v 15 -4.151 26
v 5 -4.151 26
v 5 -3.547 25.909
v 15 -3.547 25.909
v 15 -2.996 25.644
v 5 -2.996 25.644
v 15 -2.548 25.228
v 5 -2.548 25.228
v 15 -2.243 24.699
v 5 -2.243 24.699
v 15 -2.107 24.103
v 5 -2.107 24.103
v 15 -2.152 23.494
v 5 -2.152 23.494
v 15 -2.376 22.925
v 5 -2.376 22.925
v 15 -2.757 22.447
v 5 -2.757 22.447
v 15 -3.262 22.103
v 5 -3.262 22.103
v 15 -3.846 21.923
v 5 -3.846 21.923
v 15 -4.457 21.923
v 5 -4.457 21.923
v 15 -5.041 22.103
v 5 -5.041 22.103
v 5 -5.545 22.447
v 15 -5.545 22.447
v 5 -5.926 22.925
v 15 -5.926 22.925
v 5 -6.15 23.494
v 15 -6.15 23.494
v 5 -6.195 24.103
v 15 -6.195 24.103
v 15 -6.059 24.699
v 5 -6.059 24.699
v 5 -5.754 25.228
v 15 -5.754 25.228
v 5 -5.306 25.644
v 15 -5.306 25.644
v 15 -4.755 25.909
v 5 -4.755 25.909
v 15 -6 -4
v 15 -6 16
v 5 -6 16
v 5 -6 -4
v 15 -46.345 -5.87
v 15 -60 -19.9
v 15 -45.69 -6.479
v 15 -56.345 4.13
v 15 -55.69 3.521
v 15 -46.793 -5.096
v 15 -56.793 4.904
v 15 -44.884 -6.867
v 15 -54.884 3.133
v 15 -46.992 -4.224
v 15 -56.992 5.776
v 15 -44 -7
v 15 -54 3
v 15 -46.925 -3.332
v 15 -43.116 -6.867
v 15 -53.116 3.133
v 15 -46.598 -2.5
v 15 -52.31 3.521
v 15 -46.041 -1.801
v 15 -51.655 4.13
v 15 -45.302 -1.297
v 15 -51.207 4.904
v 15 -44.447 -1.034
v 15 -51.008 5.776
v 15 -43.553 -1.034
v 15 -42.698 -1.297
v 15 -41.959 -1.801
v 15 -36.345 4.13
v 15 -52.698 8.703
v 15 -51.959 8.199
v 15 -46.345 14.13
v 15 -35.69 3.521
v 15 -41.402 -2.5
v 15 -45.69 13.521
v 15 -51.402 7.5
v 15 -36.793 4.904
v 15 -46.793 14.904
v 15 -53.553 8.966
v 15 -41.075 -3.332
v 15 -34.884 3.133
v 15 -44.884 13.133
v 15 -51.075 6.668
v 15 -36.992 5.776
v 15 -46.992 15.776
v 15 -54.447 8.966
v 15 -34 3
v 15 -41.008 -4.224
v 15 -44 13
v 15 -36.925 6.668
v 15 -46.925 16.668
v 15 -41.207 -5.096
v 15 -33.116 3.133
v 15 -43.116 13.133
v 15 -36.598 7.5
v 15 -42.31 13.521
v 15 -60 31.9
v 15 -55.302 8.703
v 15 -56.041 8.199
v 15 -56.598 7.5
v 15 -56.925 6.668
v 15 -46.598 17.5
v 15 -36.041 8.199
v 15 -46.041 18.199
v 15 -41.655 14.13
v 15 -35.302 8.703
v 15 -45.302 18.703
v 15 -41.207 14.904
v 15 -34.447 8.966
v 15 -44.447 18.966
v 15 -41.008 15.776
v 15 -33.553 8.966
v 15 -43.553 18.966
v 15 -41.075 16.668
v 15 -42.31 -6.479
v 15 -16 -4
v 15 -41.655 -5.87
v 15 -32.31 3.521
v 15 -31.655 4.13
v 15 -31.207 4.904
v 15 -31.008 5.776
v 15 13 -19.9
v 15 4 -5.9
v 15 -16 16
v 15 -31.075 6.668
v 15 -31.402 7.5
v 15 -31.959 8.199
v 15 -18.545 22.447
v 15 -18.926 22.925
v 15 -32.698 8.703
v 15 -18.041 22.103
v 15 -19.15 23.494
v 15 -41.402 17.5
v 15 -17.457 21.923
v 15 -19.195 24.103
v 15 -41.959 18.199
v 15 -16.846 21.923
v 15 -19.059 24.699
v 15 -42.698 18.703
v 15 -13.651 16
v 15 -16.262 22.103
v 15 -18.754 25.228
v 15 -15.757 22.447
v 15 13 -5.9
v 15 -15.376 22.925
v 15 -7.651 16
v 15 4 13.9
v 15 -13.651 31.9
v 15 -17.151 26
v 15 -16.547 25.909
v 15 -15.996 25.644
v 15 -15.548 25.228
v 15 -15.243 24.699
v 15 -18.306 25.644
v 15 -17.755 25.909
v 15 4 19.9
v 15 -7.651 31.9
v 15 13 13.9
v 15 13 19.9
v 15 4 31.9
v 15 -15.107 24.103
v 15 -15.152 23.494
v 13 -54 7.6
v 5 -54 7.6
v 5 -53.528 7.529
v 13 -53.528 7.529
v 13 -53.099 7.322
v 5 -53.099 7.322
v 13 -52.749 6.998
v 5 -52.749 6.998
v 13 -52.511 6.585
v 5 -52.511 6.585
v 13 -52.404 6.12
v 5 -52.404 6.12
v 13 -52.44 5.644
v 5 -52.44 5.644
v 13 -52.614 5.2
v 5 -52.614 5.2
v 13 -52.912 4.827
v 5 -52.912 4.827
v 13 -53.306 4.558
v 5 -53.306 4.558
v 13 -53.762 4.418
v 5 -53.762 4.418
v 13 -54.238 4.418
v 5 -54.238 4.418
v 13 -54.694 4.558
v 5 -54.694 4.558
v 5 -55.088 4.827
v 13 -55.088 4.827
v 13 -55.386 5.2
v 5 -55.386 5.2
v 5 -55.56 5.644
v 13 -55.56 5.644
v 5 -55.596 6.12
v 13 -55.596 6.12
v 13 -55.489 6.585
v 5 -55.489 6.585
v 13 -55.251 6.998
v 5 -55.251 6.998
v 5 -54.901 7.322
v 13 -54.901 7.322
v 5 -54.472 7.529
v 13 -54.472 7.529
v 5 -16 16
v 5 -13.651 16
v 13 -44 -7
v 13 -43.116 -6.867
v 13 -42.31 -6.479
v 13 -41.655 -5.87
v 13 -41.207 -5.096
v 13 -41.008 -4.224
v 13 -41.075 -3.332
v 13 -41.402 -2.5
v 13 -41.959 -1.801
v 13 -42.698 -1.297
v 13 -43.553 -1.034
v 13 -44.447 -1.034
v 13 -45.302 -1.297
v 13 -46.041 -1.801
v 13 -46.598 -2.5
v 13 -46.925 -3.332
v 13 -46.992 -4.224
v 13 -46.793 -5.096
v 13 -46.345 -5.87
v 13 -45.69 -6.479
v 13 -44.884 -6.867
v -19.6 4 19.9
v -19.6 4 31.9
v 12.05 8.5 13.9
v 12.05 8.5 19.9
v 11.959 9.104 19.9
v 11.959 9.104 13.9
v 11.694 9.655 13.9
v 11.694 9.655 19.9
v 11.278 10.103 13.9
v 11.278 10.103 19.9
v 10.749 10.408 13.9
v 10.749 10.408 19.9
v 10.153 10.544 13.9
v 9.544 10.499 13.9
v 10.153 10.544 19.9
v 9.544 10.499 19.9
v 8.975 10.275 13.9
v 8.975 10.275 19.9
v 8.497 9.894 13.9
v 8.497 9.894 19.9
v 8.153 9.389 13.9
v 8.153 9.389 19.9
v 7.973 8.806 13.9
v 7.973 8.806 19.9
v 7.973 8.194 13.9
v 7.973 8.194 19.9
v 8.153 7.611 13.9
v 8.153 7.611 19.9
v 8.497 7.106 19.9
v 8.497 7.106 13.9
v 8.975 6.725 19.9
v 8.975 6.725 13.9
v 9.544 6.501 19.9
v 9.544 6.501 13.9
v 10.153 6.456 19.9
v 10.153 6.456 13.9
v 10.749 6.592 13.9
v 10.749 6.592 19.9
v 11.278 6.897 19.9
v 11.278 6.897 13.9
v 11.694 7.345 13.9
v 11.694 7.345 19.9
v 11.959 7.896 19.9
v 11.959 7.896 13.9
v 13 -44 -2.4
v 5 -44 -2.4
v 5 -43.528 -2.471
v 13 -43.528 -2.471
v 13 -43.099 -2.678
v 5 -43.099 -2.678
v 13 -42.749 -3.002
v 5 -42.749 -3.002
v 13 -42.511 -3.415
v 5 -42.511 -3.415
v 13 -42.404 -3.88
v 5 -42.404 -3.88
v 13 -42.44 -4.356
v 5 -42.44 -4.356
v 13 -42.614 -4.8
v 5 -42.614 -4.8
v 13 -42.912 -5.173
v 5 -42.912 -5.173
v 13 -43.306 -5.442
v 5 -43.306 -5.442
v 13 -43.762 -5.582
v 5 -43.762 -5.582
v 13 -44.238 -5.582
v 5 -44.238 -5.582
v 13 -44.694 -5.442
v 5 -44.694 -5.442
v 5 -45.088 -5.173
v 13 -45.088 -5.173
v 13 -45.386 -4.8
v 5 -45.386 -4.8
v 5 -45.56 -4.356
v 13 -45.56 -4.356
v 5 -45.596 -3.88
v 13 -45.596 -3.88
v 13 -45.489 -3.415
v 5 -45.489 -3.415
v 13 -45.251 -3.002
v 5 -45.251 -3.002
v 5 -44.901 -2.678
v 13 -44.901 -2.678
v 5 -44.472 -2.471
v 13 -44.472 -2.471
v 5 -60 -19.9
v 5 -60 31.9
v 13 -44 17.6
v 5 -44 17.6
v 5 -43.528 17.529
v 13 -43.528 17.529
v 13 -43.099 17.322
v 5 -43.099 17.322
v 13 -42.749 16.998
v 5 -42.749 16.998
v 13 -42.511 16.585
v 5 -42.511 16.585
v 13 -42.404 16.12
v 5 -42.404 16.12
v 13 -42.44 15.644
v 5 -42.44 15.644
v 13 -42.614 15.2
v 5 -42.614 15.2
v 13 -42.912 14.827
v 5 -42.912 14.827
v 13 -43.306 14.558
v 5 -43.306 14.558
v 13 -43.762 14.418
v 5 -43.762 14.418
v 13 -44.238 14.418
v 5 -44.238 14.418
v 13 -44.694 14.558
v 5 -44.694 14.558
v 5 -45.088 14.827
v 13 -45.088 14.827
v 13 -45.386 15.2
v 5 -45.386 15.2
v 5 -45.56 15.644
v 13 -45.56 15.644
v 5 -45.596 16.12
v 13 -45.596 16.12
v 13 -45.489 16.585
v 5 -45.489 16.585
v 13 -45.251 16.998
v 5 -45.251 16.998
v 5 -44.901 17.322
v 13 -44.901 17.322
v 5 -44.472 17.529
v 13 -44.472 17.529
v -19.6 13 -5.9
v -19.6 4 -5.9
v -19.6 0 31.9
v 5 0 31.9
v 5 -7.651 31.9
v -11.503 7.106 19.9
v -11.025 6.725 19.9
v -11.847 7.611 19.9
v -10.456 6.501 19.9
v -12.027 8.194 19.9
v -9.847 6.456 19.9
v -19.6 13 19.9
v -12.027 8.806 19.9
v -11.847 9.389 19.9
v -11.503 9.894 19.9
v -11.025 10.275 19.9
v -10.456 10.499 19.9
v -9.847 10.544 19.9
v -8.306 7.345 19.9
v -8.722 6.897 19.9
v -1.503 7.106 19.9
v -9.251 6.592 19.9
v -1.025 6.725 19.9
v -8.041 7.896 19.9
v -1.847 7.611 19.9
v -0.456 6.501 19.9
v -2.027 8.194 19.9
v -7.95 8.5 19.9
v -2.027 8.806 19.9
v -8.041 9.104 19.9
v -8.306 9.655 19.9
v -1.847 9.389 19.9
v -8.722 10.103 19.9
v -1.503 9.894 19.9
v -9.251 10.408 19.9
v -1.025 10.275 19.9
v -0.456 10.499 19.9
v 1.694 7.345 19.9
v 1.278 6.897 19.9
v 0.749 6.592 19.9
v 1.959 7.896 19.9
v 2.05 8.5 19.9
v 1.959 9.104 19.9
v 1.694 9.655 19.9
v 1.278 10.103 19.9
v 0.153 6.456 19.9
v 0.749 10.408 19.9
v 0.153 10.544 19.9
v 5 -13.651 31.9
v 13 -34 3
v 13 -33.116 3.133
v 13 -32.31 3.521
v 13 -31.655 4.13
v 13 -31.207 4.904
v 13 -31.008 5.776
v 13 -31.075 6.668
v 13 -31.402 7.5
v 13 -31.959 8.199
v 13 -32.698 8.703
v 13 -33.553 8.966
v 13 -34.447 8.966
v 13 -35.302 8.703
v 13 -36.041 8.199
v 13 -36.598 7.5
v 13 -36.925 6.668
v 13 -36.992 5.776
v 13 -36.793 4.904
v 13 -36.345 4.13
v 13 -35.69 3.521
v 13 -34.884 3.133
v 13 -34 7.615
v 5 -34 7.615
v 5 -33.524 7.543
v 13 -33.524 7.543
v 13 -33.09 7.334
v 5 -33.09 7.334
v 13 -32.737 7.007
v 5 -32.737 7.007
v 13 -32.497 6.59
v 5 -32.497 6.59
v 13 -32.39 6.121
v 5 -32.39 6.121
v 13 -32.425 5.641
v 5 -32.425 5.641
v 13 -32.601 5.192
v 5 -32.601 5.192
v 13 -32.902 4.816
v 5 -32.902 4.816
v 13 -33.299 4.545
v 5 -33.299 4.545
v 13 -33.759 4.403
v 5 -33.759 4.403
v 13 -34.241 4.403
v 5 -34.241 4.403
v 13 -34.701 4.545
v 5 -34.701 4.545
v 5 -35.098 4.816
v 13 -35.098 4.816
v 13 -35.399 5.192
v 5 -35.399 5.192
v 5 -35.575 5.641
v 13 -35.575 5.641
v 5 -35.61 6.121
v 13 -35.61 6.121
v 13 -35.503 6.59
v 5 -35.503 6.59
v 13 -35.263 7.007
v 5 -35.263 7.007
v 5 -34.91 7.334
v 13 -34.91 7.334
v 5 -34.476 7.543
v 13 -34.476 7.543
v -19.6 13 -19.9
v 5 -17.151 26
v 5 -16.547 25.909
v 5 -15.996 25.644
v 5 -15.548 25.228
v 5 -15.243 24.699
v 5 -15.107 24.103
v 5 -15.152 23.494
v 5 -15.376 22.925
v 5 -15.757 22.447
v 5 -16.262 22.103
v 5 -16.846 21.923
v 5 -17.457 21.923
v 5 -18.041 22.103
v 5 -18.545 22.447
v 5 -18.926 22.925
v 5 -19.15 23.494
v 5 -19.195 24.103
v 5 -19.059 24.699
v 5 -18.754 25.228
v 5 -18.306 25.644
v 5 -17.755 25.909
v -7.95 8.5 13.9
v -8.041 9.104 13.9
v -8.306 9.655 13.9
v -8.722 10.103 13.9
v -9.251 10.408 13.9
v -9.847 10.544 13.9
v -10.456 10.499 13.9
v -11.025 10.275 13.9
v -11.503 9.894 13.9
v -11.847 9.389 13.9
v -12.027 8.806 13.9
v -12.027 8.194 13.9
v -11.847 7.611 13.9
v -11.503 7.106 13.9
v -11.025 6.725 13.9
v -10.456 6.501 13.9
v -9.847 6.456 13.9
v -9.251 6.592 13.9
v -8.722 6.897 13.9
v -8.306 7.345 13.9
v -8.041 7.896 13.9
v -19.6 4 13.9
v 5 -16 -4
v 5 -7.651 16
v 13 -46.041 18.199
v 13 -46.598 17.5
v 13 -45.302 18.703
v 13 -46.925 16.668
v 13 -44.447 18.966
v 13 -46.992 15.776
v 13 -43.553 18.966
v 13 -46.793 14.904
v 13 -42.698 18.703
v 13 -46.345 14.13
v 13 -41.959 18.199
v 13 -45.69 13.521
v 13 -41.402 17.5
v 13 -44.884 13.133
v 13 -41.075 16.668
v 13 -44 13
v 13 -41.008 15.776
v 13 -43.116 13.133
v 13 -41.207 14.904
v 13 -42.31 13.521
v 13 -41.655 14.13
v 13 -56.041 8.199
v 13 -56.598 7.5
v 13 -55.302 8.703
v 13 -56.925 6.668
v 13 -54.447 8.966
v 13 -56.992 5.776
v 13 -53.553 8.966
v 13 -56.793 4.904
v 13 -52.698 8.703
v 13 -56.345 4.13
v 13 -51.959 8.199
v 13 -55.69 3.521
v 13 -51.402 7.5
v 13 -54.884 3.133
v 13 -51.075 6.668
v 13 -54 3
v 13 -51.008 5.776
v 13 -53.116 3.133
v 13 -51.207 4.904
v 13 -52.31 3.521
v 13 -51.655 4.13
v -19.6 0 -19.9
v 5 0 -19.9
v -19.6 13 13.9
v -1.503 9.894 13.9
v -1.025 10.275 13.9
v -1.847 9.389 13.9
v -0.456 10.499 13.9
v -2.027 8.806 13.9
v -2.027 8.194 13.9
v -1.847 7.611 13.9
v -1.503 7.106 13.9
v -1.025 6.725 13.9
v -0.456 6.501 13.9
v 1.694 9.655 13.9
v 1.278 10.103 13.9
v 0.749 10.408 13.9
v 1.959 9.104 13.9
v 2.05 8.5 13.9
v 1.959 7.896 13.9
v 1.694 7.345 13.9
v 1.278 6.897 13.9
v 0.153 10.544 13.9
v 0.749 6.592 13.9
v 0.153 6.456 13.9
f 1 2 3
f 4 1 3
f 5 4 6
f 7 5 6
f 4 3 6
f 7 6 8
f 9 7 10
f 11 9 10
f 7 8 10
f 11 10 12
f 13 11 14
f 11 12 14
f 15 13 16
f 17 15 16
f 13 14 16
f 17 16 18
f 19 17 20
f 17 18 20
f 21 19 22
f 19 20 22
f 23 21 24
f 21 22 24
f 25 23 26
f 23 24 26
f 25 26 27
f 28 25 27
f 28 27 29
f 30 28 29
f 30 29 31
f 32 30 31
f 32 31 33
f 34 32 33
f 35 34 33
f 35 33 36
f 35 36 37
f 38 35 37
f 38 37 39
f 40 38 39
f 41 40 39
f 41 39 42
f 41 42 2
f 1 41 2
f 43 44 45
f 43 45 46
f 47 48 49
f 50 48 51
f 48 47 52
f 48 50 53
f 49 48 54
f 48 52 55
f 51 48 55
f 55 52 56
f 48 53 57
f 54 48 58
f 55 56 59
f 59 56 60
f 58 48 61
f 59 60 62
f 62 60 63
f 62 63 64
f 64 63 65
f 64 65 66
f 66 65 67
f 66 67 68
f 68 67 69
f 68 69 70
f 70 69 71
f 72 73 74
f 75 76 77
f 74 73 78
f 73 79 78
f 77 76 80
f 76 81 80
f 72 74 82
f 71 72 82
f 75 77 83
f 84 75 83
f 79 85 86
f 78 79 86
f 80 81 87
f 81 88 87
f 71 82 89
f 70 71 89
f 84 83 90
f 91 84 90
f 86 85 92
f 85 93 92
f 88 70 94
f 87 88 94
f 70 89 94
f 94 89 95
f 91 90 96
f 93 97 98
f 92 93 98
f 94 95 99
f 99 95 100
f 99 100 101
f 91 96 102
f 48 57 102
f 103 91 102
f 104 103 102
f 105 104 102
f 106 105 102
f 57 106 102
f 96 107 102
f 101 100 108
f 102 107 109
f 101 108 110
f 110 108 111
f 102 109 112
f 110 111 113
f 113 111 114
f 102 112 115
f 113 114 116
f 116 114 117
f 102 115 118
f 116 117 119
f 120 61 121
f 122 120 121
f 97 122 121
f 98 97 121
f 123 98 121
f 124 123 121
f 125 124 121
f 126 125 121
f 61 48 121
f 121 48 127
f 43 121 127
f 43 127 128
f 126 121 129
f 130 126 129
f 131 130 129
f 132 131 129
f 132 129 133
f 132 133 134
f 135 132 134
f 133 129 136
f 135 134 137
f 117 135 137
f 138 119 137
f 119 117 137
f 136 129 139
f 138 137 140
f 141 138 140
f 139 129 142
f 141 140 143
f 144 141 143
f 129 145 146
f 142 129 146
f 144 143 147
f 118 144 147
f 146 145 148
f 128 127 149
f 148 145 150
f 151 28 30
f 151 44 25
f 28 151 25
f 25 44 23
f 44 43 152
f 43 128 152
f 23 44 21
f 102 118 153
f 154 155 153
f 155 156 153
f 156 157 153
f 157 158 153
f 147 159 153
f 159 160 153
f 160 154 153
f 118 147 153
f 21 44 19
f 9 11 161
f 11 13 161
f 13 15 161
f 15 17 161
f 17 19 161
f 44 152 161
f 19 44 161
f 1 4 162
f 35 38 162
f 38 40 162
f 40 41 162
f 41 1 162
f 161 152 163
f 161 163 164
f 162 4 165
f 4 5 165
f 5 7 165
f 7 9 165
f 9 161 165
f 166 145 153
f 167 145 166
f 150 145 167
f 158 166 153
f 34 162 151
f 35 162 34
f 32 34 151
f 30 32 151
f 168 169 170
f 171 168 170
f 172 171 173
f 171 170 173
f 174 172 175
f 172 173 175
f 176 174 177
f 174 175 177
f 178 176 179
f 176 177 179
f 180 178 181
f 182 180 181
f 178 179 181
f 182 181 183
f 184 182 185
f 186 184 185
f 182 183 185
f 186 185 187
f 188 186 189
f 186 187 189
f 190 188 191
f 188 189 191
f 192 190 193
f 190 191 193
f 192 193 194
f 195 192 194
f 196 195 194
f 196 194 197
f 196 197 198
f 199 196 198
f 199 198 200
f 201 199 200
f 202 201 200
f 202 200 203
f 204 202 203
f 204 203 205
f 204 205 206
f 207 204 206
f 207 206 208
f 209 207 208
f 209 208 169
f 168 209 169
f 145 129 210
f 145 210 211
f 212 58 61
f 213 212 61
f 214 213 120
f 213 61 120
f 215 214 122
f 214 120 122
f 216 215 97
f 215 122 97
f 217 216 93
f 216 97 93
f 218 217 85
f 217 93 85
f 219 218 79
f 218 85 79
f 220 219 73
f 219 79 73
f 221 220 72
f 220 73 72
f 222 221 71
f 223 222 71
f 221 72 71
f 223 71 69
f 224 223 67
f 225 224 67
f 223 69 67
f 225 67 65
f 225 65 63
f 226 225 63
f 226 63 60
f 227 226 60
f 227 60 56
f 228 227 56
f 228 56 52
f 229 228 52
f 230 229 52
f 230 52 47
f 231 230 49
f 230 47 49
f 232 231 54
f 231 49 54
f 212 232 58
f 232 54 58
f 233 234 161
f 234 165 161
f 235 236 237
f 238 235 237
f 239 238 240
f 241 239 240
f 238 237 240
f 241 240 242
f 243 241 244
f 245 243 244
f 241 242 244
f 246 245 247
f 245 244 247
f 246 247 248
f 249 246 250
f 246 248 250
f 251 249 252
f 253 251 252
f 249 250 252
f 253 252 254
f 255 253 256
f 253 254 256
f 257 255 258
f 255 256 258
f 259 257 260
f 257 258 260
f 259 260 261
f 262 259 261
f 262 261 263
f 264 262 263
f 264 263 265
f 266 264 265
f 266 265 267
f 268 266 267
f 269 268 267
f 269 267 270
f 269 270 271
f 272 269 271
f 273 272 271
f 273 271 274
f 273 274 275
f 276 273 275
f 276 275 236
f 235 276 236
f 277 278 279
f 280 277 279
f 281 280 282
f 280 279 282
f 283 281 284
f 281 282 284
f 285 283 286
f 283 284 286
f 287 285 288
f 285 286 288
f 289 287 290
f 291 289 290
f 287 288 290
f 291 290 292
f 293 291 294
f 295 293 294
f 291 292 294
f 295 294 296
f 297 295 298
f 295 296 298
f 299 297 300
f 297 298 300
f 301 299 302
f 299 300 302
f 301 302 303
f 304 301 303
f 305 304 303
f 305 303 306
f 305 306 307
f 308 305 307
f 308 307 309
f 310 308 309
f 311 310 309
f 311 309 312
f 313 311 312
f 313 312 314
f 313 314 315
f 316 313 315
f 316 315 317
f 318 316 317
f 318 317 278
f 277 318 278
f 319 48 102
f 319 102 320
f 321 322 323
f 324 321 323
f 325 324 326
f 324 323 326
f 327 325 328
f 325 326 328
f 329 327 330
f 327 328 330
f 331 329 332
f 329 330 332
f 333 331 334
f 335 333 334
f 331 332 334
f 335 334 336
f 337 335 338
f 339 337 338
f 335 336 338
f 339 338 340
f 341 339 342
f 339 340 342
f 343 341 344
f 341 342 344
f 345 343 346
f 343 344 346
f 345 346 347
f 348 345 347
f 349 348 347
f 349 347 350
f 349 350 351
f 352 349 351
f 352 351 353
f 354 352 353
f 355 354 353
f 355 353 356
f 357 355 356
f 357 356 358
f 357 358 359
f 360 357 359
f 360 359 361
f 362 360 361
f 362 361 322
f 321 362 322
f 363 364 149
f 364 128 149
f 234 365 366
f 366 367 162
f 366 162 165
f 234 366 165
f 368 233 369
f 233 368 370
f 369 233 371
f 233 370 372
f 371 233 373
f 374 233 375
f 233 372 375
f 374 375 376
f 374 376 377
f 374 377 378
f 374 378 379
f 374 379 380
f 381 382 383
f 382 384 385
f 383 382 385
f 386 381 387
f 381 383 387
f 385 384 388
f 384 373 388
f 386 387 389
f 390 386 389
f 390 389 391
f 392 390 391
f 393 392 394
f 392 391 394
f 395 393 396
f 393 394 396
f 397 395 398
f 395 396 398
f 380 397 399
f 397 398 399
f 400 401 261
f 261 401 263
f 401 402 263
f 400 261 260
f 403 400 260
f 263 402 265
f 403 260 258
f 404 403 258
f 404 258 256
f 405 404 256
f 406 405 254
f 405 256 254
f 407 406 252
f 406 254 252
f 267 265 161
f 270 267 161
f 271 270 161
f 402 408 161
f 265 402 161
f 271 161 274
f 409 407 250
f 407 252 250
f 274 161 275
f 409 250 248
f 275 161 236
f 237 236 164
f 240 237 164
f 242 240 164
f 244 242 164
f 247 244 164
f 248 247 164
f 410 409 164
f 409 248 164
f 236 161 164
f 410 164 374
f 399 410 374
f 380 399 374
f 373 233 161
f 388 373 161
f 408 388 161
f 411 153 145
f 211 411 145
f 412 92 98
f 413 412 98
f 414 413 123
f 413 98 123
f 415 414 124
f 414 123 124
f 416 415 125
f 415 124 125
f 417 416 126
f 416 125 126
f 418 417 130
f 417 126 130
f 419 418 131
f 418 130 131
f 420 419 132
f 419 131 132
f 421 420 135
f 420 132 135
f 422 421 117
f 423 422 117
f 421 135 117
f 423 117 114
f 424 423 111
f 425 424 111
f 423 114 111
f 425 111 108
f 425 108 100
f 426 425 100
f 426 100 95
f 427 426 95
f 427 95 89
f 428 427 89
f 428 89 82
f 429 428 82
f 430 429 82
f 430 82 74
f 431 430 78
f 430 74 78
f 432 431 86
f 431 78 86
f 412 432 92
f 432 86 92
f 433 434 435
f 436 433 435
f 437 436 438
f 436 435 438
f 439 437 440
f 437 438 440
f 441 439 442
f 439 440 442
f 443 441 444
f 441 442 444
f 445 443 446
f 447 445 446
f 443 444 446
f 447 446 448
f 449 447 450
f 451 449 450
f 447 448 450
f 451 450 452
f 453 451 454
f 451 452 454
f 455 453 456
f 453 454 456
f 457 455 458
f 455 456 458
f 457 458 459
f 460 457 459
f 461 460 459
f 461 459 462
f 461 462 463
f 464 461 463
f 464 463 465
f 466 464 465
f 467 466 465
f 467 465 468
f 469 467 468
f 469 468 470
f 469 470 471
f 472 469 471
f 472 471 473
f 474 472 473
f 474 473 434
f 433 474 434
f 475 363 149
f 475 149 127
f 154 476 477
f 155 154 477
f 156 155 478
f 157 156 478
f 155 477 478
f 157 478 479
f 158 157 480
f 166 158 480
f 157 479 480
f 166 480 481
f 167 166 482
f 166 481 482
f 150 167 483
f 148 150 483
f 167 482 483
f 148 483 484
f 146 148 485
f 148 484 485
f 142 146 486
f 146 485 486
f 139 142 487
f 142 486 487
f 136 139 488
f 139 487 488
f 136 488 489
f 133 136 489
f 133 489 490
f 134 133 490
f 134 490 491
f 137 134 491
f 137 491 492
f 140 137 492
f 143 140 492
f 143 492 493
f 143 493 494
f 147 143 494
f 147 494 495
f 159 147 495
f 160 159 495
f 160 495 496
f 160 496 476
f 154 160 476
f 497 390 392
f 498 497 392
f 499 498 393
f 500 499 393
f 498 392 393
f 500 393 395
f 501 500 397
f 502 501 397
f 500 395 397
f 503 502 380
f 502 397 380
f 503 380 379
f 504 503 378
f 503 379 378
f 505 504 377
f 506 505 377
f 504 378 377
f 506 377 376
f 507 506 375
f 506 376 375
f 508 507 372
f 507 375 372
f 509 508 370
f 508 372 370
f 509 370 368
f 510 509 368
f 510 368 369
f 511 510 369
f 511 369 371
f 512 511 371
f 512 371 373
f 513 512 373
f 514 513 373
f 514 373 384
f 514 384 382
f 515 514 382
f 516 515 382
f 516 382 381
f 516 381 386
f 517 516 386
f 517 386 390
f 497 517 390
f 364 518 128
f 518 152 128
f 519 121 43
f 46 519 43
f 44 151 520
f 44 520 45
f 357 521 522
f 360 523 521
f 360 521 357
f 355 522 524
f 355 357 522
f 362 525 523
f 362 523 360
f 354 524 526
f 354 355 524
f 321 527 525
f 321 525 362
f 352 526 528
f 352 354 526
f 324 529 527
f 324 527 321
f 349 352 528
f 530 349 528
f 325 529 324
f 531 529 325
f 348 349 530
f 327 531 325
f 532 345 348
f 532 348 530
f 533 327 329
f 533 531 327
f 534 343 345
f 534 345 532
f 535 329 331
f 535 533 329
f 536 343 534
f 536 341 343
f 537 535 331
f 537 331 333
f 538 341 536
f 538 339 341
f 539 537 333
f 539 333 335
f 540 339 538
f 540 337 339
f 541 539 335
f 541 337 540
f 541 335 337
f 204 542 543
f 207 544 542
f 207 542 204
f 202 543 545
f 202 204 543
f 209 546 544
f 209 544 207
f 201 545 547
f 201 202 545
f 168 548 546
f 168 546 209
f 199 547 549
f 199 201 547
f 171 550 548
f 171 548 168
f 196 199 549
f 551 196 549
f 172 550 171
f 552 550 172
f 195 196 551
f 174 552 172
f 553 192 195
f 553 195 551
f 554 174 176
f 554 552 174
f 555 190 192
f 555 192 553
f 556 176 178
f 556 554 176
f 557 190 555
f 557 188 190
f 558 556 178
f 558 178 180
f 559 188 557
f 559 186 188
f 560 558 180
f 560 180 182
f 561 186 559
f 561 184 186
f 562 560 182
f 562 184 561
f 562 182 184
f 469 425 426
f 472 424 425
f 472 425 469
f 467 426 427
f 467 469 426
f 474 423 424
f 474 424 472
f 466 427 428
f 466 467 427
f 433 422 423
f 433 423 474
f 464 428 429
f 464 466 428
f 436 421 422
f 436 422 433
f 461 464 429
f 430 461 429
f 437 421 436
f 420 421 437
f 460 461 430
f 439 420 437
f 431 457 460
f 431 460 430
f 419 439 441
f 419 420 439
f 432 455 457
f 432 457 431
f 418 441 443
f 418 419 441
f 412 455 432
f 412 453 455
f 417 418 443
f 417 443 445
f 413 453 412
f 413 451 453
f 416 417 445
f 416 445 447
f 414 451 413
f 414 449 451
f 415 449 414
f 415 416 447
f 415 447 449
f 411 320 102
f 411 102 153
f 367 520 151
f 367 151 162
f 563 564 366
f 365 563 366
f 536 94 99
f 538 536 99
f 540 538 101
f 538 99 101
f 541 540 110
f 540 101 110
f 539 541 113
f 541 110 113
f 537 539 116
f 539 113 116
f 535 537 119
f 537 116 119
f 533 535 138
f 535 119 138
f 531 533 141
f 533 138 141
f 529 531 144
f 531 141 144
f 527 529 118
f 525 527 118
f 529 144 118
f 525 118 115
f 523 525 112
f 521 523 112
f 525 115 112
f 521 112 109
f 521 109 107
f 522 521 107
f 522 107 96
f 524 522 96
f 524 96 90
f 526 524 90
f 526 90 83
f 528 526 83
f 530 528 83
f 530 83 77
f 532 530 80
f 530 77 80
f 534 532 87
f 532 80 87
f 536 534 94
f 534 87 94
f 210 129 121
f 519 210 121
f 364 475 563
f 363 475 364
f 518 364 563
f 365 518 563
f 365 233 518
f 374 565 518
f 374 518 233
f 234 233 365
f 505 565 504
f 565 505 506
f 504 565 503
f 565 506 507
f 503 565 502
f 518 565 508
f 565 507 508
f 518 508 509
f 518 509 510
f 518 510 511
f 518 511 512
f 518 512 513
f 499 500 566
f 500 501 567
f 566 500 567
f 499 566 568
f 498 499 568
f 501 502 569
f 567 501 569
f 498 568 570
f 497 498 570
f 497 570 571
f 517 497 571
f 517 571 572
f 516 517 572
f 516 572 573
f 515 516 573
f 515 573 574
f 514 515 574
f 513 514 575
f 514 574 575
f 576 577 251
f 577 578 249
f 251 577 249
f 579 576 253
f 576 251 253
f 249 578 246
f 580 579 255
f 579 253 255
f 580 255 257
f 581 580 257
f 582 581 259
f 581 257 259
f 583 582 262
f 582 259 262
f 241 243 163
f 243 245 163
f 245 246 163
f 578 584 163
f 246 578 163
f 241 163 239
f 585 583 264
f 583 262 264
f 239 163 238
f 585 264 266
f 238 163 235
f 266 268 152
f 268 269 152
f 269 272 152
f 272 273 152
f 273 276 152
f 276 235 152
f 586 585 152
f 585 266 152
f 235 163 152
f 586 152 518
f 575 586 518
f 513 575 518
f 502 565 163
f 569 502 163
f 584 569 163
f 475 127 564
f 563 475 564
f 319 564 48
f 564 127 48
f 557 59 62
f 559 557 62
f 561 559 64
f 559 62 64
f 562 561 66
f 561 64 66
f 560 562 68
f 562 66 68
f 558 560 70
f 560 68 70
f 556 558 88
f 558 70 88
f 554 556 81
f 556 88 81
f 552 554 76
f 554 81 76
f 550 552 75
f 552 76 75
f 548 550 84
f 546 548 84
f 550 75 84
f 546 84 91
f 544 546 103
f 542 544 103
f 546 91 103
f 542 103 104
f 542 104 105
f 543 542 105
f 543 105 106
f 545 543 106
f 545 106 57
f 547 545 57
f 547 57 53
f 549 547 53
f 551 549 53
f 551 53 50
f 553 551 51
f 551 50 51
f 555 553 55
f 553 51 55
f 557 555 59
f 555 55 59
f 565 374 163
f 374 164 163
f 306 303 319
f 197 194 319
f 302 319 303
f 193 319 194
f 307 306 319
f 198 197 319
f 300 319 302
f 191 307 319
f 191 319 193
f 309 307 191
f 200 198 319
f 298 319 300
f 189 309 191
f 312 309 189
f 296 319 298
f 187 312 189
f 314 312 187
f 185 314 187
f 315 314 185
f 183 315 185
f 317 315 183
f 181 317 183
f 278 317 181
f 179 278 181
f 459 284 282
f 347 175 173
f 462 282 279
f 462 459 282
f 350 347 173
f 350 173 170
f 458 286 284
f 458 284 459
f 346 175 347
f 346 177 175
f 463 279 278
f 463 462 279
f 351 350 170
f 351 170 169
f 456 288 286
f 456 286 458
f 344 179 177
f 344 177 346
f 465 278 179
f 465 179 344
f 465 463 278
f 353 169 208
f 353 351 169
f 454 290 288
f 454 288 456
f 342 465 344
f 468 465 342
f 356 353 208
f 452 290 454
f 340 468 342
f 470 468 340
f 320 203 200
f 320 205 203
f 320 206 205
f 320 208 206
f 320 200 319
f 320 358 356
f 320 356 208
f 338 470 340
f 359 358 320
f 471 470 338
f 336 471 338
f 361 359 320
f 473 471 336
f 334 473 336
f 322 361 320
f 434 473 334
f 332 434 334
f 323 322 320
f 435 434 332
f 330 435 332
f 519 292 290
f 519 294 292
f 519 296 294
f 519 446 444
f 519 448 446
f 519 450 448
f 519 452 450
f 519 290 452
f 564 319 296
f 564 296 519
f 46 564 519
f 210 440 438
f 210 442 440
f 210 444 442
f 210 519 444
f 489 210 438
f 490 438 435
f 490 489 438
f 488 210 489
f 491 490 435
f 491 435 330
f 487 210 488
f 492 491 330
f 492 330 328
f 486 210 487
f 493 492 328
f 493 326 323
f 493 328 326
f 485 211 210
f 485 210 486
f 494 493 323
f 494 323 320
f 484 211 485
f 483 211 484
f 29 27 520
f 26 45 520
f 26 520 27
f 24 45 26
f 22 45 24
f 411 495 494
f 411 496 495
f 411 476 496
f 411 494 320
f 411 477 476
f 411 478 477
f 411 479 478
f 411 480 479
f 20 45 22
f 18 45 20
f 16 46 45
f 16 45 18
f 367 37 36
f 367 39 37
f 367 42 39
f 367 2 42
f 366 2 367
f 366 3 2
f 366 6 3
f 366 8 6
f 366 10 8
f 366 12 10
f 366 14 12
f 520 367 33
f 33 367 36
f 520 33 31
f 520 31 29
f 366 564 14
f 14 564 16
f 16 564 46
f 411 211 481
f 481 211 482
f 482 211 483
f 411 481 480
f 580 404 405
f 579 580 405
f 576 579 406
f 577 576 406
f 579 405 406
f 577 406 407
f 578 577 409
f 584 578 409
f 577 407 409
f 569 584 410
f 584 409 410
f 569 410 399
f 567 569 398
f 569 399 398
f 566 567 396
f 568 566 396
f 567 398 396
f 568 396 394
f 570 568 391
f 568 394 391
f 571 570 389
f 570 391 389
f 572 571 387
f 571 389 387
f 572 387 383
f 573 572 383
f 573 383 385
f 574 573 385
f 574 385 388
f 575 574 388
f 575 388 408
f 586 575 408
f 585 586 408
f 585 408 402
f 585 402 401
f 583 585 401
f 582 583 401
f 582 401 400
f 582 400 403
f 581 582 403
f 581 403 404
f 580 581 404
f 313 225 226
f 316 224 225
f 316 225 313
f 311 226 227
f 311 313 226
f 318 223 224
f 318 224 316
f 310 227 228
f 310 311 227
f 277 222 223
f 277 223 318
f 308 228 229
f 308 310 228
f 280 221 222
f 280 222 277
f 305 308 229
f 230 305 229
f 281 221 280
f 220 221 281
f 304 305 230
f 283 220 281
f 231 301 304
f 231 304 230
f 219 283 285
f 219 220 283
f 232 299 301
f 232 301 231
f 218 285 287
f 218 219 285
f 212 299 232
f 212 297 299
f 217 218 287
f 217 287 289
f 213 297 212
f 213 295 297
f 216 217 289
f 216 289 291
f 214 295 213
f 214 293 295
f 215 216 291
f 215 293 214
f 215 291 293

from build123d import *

# Parameters (mm, degrees)
SKETCH_1_W          = 30
SKETCH_1_H          = 39.8
EXTRUDE_1_DEPTH     = 4
SKETCH_2_W          = 30
SKETCH_2_H          = 14
EXTRUDE_2_DEPTH     = 9
SKETCH_3_W          = 30
SKETCH_3_H          = 6
EXTRUDE_3_DEPTH     = 9
SKETCH_4_W          = 10
SKETCH_4_H          = 39.8
EXTRUDE_4_DEPTH     = 60
SKETCH_5_W          = 20
SKETCH_5_H          = 10
CUT_EXTRUDE_1_DEPTH = 70.971494196
SKETCH_6_W          = 3.9
SKETCH_6_H          = 6
CUT_EXTRUDE_2_DEPTH = 70.971494196
SKETCH_8_W          = 12
SKETCH_8_H          = 4
EXTRUDE_5_DEPTH     = 30
SKETCH_9_W          = 12
SKETCH_9_H          = 7.651073012
SKETCH_9_H_2        = 46.348926988
EXTRUDE_6_DEPTH     = 10
SKETCH_13_R         = 1.6
SKETCH_13_R_2       = 1.615
CUT_EXTRUDE_3_DEPTH = 71.835090174
SKETCH_14_R         = 3
CUT_EXTRUDE_4_DEPTH = 2
CUT_EXTRUDE_5_REACH = 75.546
SKETCH_16_R         = 2.05
SKETCH_18_R         = 2.05
CUT_EXTRUDE_7_DEPTH = 71.835090174
STOPPER_DEPTH       = 4.6


with BuildPart() as part:
    # 草图1 → 凸台-拉伸1 (new body)
    with BuildSketch(Plane(origin=(0, 0, 0), x_dir=(1, 0, 0), z_dir=(0, 1, 0))):
        Rectangle(SKETCH_1_W, SKETCH_1_H)
    extrude(amount=EXTRUDE_1_DEPTH)

    # 草图2 → 凸台-拉伸2 (add)
    with BuildSketch(Plane(origin=(0, 4, 0), x_dir=(1, 0, 0), z_dir=(0, 1, 0))):
        with Locations((0, 12.9)):
            Rectangle(SKETCH_2_W, SKETCH_2_H)
    extrude(amount=EXTRUDE_2_DEPTH)

    # 草图3 → 凸台-拉伸3 (add)
    with BuildSketch(Plane(origin=(0, 4, 0), x_dir=(1, 0, 0), z_dir=(0, 1, 0))):
        with Locations((0, -16.9)):
            Rectangle(SKETCH_3_W, SKETCH_3_H)
    extrude(amount=EXTRUDE_3_DEPTH)

    # 草图4 → 凸台-拉伸4 (add)
    with BuildSketch(Plane(origin=(0, 0, 0), x_dir=(-1, 0, 0), z_dir=(0, -1, 0))):
        with Locations((-10, 0)):
            Rectangle(SKETCH_4_W, SKETCH_4_H)
    extrude(amount=EXTRUDE_4_DEPTH)

    # 草图5 → 切除-拉伸1 (cut, through all)
    with BuildSketch(Plane(origin=(15, 0, 0), x_dir=(0, 0, -1), z_dir=(1, 0, 0))):
        with Locations((-6, -11)):
            Rectangle(SKETCH_5_W, SKETCH_5_H)
    extrude(amount=-CUT_EXTRUDE_1_DEPTH, mode=Mode.SUBTRACT)

    # 草图6 → 切除-拉伸2 (cut, through all)
    with BuildSketch(Plane(origin=(15, 0, 0), x_dir=(0, 0, -1), z_dir=(1, 0, 0))):
        with Locations((-17.95, -10.651073012)):
            Rectangle(SKETCH_6_W, SKETCH_6_H)
    extrude(amount=-CUT_EXTRUDE_2_DEPTH, mode=Mode.SUBTRACT)

    # 草图8 → 凸台-拉伸5 (add)
    with BuildSketch(Plane.ZY.offset(15)):
        with Locations((25.9, 2)):
            Rectangle(SKETCH_8_W, SKETCH_8_H)
    extrude(amount=-EXTRUDE_5_DEPTH)

    # 草图9 → 凸台-拉伸6 (add)
    with BuildSketch(Plane.ZY.offset(-5)):
        with Locations((25.9, -3.825536506)):
            Rectangle(SKETCH_9_W, SKETCH_9_H)
        with Locations((25.9, -36.825536506)):
            Rectangle(SKETCH_9_W, SKETCH_9_H_2)
    extrude(amount=-EXTRUDE_6_DEPTH)

    # 草图13 → 切除-拉伸3 (cut, through all)
    with BuildSketch(Plane.ZY.offset(-5)):
        with Locations((-4, -44)):
            Circle(SKETCH_13_R)
        with Locations((6, -34)):
            Circle(SKETCH_13_R_2)
        with Locations((16, -44)):
            Circle(SKETCH_13_R)
        with Locations((6, -54)):
            Circle(SKETCH_13_R)
    extrude(amount=-CUT_EXTRUDE_3_DEPTH, mode=Mode.SUBTRACT)

    # 草图14 → 切除-拉伸4 (cut)
    with BuildSketch(Plane(origin=(15, 0, 0), x_dir=(0, 0, -1), z_dir=(1, 0, 0))):
        with Locations((-6, -34)):
            Circle(SKETCH_14_R)
        with Locations((-16, -44)):
            Circle(SKETCH_14_R)
        with Locations((-6, -54)):
            Circle(SKETCH_14_R)
        with Locations((4, -44)):
            Circle(SKETCH_14_R)
    extrude(amount=-CUT_EXTRUDE_4_DEPTH, mode=Mode.SUBTRACT)

    # 草图16 → 切除-拉伸5 (cut, up to next)
    with BuildSketch(Plane.XY.offset(19.9), mode=Mode.PRIVATE) as cut_extrude_5_sk1:
        with Locations((-10, 8.5)):
            Circle(SKETCH_16_R)
    cut_extrude_5_tool1 = extrude(cut_extrude_5_sk1.sketch, amount=-CUT_EXTRUDE_5_REACH, mode=Mode.PRIVATE) & part.part
    # 草图16 → 切除-拉伸5 (cut, up to next)
    with BuildSketch(Plane.XY.offset(19.9), mode=Mode.PRIVATE) as cut_extrude_5_sk2:
        with Locations((0, 8.5)):
            Circle(SKETCH_16_R)
    cut_extrude_5_tool2 = extrude(cut_extrude_5_sk2.sketch, amount=-CUT_EXTRUDE_5_REACH, mode=Mode.PRIVATE) & part.part
    # 草图16 → 切除-拉伸5 (cut, up to next)
    with BuildSketch(Plane.XY.offset(19.9), mode=Mode.PRIVATE) as cut_extrude_5_sk3:
        with Locations((10, 8.5)):
            Circle(SKETCH_16_R)
    cut_extrude_5_tool3 = extrude(cut_extrude_5_sk3.sketch, amount=-CUT_EXTRUDE_5_REACH, mode=Mode.PRIVATE) & part.part
    add(cut_extrude_5_tool1.solids().sort_by_distance((-10, 8.5, 19.9))[0], mode=Mode.SUBTRACT)
    add(cut_extrude_5_tool2.solids().sort_by_distance((0, 8.5, 19.9))[0], mode=Mode.SUBTRACT)
    add(cut_extrude_5_tool3.solids().sort_by_distance((10, 8.5, 19.9))[0], mode=Mode.SUBTRACT)

    # 草图18 → 切除-拉伸7 (cut, through all)
    with BuildSketch(Plane.ZY.offset(-5)):
        with Locations((23.95, -4.151073012)):
            Circle(SKETCH_18_R)
        with Locations((23.95, -17.151073012)):
            Circle(SKETCH_18_R)
    extrude(amount=-CUT_EXTRUDE_7_DEPTH, mode=Mode.SUBTRACT)

    # 草图21 → Stopper (add)
    with BuildSketch(Plane.ZY.offset(15)):
        Polygon((31.9, 0), (31.9, 4), (19.9, 4), (19.9, 13), (13.9, 13), (13.9, 4), (-5.9, 4), (-5.9, 13), (-19.9, 13), (-19.9, 0), align=None)
    extrude(amount=STOPPER_DEPTH)


solid = part.part
